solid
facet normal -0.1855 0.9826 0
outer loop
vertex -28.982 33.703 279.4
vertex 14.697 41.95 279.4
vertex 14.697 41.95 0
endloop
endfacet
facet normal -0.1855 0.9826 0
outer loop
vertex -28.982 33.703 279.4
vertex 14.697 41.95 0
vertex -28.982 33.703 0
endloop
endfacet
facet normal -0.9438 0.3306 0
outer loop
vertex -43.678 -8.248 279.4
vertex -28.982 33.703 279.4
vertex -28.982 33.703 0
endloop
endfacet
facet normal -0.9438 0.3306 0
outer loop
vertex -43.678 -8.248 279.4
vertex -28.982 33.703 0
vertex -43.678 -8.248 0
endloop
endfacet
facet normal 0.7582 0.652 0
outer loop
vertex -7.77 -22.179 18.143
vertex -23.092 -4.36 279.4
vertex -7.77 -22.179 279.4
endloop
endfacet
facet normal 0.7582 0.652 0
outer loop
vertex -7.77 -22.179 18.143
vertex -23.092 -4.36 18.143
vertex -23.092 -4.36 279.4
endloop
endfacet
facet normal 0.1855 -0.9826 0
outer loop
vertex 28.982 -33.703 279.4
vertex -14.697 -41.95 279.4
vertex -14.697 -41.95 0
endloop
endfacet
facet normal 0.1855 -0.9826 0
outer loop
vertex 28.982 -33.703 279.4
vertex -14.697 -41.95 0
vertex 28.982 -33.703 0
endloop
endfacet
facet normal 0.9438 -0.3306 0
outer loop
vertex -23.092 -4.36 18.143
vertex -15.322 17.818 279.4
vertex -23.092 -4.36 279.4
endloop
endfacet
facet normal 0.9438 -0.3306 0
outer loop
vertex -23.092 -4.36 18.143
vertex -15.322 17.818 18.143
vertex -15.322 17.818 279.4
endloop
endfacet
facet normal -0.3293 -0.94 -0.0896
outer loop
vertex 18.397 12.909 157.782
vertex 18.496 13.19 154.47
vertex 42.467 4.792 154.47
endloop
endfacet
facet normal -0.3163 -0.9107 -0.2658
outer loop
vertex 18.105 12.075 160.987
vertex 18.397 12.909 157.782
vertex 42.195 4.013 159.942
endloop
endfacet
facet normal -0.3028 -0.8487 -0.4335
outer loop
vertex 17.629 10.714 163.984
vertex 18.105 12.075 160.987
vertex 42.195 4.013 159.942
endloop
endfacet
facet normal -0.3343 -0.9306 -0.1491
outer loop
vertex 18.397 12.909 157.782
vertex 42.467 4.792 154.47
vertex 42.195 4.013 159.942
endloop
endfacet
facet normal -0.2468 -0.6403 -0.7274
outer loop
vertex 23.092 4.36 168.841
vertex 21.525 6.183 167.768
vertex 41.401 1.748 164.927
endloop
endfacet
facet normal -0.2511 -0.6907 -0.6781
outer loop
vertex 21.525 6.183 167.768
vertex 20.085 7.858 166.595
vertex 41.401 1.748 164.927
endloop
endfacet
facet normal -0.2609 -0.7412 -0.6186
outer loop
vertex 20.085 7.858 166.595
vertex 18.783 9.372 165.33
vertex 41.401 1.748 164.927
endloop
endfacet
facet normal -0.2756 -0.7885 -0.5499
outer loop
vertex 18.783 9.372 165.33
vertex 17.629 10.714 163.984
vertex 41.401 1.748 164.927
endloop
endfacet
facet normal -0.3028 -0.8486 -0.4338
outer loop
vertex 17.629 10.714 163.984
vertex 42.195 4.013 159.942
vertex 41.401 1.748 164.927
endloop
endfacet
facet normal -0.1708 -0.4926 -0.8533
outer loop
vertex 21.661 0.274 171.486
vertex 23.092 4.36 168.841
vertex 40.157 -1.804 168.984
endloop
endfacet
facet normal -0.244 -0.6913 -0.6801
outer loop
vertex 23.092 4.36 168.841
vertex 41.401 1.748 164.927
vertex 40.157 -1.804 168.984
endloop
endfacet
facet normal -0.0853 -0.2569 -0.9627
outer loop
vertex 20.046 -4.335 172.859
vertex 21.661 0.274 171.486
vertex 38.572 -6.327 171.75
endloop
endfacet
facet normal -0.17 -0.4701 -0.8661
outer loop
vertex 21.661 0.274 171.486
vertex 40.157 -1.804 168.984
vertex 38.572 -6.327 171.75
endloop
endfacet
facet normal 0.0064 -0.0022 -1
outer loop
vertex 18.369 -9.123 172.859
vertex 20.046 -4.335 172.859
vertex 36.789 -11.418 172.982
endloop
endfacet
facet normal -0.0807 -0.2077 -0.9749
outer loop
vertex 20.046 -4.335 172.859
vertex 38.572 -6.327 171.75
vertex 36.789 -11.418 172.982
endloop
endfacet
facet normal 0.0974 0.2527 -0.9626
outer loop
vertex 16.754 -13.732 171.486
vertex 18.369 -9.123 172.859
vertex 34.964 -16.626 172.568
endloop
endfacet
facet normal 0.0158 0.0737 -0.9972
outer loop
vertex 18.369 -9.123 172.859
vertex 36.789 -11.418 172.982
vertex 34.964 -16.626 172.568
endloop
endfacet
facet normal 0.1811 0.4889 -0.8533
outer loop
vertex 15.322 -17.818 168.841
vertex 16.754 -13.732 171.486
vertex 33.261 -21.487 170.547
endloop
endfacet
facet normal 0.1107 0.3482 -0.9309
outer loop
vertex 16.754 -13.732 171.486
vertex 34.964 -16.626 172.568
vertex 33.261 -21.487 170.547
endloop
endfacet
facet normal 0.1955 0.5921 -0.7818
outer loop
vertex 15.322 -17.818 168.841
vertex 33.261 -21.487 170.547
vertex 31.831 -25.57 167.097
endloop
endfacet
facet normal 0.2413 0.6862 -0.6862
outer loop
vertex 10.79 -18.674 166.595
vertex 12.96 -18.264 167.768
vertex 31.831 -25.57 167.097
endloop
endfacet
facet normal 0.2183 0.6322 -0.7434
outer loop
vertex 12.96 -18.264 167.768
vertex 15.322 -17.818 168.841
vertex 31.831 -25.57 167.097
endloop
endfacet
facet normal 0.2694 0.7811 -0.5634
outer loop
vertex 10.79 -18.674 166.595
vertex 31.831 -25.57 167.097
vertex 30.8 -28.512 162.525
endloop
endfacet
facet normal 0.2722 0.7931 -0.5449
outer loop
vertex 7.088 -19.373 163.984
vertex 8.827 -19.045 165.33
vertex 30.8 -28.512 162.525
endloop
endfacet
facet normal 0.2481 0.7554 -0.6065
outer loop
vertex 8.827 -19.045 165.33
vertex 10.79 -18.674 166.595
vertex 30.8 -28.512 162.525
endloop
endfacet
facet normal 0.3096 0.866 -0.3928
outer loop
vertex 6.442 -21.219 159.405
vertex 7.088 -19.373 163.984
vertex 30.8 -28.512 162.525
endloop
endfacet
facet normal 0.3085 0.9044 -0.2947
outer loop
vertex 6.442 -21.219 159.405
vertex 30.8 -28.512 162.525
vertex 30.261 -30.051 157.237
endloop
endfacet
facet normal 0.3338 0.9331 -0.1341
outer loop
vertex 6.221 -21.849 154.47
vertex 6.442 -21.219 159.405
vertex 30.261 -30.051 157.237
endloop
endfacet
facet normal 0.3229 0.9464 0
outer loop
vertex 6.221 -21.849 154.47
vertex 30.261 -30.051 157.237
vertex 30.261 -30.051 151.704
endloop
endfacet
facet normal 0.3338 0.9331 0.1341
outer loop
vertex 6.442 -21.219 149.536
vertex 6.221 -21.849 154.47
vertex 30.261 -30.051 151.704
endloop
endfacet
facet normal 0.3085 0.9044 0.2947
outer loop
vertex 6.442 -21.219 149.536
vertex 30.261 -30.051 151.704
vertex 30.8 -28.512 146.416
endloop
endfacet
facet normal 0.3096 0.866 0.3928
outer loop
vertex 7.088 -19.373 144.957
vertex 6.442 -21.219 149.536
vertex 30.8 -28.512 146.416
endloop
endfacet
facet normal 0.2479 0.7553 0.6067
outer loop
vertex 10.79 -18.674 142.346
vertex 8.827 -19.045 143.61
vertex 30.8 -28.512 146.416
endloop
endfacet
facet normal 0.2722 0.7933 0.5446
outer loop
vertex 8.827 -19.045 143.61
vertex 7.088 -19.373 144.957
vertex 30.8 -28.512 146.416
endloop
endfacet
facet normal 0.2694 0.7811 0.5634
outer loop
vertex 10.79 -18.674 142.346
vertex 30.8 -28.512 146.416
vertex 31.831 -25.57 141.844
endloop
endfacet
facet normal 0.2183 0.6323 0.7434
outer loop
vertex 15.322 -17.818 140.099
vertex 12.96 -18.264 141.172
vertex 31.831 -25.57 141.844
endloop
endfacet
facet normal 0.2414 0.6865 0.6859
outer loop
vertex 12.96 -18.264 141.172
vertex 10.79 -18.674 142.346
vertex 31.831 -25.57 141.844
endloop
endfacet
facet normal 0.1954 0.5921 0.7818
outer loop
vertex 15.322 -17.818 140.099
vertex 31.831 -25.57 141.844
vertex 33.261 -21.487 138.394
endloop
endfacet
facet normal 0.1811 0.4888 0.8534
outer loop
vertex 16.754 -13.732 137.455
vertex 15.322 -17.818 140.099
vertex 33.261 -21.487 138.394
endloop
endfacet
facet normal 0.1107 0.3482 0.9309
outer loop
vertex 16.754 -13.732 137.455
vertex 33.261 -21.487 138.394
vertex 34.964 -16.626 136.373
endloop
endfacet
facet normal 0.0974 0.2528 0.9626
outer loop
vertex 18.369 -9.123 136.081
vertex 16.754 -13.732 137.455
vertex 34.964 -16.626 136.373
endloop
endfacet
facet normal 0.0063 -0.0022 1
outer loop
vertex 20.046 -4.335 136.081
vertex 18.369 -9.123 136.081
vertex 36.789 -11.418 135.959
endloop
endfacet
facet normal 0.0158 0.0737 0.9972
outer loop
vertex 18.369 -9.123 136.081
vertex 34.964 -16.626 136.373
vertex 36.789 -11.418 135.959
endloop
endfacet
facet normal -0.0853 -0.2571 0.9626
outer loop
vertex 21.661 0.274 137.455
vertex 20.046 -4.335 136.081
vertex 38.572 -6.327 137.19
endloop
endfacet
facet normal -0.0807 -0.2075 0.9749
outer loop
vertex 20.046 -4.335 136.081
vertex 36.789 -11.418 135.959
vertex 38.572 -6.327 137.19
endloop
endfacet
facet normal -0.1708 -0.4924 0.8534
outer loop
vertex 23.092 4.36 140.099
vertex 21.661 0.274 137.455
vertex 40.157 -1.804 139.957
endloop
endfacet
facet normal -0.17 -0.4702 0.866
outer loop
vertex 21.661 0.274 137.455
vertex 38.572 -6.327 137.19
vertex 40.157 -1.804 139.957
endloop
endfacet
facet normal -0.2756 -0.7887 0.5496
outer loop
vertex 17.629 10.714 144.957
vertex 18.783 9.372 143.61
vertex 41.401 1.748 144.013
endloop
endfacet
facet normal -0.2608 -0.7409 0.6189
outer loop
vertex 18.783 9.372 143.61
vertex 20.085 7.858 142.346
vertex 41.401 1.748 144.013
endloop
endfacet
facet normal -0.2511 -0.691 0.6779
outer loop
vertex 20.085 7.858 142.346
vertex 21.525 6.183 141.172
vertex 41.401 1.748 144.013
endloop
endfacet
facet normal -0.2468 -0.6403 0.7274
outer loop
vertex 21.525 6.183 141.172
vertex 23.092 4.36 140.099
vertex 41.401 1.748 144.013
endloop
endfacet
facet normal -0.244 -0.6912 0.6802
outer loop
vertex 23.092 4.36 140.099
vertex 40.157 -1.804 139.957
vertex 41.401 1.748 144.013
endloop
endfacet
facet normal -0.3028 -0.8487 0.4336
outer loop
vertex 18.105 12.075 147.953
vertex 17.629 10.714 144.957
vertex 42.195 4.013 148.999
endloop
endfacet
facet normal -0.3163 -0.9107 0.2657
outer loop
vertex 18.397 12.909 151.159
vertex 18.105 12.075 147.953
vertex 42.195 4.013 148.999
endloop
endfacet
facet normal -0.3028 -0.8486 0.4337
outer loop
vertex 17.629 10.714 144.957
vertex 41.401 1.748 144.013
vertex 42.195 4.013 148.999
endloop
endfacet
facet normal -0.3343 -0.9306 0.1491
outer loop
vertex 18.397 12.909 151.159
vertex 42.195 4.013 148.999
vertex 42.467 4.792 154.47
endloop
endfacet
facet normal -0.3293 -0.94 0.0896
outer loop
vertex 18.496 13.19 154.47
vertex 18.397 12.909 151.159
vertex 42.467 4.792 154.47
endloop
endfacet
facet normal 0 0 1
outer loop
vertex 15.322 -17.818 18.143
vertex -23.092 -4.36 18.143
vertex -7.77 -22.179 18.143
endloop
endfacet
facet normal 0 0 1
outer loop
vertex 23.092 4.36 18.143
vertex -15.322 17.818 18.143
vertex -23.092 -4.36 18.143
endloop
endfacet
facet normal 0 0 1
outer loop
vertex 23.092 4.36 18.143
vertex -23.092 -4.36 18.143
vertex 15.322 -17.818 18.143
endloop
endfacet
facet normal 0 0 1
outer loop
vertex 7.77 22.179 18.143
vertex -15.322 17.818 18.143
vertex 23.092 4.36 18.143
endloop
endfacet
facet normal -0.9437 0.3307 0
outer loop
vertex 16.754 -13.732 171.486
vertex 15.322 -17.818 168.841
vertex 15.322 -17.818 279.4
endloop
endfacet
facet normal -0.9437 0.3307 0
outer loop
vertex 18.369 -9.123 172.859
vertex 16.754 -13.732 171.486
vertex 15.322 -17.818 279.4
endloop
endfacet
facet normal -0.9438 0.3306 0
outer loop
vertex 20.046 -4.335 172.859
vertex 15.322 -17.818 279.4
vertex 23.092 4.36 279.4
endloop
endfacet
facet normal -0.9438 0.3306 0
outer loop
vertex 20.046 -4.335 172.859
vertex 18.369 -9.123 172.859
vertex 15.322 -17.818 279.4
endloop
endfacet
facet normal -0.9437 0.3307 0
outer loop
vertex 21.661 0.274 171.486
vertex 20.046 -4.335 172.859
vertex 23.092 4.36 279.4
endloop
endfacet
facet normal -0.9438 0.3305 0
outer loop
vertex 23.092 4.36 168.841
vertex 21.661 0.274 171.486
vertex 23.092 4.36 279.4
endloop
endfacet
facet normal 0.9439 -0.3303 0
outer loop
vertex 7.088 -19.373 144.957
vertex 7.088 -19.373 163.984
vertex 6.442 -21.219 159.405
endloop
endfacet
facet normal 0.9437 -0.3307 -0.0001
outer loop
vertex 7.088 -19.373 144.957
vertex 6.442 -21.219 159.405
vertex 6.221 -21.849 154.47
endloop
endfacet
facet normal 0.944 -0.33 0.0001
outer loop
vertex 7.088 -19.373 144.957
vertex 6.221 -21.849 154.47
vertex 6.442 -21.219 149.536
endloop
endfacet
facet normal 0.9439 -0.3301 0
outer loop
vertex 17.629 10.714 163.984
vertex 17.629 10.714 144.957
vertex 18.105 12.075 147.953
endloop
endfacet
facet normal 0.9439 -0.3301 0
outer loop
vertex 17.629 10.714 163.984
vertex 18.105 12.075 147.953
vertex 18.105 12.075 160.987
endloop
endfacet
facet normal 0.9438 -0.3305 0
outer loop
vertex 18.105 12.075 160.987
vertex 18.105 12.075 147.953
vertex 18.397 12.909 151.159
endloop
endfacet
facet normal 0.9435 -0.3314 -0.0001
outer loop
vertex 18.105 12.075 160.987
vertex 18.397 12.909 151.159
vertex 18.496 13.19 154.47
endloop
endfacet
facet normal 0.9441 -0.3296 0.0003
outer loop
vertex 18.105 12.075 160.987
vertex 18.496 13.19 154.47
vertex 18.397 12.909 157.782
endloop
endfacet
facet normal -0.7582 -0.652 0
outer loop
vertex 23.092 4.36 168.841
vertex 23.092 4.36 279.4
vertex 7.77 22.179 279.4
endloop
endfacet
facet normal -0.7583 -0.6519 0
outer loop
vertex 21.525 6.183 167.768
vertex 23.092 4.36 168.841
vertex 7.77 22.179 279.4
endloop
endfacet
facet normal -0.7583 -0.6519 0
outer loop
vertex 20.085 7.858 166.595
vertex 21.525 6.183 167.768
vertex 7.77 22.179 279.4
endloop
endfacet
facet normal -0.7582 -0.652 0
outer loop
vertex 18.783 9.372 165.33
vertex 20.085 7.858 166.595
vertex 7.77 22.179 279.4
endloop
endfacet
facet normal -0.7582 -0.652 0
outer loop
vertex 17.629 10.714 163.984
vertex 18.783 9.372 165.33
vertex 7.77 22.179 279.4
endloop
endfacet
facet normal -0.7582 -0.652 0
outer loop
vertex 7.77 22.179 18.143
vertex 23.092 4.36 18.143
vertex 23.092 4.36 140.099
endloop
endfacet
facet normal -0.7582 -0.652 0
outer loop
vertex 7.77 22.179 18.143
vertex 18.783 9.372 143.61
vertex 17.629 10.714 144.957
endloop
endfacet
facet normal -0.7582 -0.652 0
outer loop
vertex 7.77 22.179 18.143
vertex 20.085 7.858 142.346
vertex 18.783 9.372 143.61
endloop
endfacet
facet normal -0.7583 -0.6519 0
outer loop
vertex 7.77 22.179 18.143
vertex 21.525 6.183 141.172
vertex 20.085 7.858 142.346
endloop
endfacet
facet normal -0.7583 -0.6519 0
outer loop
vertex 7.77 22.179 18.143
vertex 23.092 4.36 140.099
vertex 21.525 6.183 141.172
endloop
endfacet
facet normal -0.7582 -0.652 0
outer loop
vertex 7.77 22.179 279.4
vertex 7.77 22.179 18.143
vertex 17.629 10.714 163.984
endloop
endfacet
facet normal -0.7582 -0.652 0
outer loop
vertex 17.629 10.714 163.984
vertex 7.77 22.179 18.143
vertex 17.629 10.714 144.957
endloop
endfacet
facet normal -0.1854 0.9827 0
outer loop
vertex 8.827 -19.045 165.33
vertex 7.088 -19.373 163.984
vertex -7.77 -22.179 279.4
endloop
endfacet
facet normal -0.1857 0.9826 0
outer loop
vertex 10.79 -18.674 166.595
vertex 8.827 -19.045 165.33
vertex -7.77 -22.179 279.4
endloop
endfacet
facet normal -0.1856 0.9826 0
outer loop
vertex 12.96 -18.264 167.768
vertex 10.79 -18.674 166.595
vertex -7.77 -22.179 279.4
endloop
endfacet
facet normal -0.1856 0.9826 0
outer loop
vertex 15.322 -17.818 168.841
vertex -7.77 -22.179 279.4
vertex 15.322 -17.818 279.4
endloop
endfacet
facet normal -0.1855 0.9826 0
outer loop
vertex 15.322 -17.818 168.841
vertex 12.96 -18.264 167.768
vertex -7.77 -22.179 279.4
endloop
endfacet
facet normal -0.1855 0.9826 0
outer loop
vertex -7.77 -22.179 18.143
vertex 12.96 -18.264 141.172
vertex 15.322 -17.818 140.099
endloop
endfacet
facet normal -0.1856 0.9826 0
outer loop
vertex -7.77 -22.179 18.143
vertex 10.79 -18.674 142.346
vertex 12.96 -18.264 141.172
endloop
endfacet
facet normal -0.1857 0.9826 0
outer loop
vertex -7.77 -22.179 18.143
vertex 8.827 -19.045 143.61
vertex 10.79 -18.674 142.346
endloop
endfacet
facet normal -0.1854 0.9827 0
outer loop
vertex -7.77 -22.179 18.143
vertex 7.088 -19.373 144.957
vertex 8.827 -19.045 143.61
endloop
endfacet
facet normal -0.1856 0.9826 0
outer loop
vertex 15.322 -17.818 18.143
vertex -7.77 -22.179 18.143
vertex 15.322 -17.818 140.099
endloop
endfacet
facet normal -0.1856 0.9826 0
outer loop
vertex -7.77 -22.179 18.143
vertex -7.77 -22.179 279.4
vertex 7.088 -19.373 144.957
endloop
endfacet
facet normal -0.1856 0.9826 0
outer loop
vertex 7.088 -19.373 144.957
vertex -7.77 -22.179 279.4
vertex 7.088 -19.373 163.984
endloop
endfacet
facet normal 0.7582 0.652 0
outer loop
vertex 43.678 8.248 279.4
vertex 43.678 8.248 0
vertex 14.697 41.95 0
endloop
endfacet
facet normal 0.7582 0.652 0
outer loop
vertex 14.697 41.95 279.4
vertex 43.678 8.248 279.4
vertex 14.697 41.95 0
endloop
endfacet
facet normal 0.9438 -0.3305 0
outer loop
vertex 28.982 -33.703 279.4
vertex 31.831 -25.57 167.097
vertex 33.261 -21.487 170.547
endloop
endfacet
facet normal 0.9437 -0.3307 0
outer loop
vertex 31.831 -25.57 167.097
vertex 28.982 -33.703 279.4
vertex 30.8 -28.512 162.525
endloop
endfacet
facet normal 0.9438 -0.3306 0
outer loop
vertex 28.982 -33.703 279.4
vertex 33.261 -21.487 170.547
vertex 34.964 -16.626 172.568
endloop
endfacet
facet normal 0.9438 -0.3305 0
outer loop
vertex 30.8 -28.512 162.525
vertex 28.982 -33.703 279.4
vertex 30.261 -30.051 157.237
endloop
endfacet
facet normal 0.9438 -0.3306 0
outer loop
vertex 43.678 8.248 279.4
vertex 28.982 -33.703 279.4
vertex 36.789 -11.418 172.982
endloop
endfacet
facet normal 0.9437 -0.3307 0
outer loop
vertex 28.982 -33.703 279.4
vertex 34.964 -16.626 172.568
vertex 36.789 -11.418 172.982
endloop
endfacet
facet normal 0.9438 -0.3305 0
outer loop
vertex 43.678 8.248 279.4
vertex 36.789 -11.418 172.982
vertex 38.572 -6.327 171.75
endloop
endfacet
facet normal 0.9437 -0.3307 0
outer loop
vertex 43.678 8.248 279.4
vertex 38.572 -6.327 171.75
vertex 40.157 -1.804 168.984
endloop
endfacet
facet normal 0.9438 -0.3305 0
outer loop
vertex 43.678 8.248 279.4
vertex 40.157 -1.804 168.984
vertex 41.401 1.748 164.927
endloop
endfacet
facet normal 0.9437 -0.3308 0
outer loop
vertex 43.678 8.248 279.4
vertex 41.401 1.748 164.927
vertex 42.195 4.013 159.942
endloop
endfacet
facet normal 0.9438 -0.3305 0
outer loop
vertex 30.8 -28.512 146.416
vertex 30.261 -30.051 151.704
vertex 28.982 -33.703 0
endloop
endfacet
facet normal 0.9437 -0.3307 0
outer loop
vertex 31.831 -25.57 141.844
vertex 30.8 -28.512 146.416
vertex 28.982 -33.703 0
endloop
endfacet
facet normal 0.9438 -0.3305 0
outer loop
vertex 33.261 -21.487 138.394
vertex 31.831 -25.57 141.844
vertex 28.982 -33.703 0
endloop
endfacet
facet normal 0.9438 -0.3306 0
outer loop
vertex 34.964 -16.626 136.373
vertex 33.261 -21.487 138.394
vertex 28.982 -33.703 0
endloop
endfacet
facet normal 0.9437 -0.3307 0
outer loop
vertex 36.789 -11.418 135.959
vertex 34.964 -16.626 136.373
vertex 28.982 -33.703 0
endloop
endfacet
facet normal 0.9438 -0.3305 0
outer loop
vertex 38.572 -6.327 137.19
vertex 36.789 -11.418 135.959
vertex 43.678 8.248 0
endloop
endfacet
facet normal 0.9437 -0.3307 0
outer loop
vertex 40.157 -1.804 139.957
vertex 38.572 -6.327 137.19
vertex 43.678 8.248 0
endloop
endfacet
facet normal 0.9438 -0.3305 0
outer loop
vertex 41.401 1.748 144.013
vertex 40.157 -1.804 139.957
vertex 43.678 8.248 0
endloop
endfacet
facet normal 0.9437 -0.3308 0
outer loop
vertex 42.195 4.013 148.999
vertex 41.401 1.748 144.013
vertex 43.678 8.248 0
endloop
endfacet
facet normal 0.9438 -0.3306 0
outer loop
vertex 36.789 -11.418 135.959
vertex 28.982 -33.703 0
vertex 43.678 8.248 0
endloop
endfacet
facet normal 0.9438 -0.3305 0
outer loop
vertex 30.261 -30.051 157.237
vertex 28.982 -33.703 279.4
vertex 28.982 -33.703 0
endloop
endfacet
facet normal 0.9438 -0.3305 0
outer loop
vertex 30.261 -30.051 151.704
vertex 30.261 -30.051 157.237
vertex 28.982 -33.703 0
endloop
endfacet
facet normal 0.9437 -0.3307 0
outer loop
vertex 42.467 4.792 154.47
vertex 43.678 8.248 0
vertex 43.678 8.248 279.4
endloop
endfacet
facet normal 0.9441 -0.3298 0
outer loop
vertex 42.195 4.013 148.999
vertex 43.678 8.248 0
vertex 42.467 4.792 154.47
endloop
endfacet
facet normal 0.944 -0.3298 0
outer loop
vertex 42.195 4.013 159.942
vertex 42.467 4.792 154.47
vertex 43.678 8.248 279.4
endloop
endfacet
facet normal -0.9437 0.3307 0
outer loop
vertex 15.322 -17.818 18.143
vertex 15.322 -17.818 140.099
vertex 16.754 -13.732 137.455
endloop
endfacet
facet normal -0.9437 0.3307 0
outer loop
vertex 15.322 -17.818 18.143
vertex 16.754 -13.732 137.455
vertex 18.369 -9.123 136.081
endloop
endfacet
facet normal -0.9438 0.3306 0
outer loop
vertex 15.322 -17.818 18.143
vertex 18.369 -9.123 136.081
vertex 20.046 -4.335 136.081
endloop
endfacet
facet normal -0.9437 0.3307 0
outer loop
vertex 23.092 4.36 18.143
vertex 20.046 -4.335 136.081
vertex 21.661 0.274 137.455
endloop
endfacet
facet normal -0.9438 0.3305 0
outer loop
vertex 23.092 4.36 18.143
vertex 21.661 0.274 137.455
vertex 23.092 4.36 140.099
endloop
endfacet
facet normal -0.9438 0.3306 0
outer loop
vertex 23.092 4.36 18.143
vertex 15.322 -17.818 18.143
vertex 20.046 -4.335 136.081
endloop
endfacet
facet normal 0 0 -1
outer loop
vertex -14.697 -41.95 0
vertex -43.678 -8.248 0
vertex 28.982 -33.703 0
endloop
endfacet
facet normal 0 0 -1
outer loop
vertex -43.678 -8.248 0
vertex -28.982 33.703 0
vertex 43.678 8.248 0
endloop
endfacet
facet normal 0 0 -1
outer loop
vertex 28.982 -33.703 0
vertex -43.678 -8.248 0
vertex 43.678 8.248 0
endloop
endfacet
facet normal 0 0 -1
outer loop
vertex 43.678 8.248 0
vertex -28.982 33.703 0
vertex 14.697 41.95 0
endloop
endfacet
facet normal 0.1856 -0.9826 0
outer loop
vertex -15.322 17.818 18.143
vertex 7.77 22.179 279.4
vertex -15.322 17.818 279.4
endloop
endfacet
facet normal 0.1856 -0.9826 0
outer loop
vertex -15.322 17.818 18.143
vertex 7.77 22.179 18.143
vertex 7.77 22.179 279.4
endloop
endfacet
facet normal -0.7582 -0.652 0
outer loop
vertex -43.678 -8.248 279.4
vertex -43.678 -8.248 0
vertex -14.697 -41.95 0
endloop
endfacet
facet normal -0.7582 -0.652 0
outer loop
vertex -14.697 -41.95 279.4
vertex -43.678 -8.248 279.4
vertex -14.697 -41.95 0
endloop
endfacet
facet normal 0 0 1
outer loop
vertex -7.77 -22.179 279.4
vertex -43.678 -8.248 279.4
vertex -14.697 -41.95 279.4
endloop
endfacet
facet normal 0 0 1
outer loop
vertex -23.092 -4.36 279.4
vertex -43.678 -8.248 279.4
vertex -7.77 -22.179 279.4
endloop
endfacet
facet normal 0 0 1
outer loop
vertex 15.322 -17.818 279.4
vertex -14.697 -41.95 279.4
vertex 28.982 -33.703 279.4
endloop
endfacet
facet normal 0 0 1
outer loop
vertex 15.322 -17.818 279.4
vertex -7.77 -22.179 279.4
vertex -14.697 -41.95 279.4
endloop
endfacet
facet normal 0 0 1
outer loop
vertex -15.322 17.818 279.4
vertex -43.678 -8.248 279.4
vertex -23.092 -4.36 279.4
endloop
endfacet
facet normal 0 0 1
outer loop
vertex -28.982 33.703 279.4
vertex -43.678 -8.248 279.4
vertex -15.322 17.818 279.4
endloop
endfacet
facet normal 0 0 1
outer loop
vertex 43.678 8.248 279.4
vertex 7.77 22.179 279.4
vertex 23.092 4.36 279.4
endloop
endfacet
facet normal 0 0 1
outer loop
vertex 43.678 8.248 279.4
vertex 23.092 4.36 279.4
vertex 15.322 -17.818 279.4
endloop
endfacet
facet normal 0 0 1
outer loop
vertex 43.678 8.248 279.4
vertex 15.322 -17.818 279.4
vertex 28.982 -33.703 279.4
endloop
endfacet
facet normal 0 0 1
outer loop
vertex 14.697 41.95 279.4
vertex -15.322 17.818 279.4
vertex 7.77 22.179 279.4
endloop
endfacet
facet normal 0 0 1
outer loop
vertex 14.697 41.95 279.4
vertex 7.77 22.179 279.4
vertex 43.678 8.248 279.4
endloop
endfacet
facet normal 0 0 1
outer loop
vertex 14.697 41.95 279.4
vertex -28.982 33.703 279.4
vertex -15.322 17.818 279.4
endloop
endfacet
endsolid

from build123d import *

# Parameters (mm, degrees)
F1_DEPTH = 279.4
F2_T     = -18.1428571429
F3_R     = 18.5632222349
F4_DEPTH = 25.4


with BuildPart() as f1:
    # F0 (on Top) → F1 (new body)
    with BuildSketch(Plane.XY):
        Polygon((43.678151575, 8.2475193234), (14.6965145353, 41.950148516), (-28.9816370398, 33.7026291926), (-43.678151575, -8.2475193234), (-14.6965145353, -41.950148516), (28.9816370398, -33.7026291926), align=None)
    extrude(amount=F1_DEPTH)

    # F2
    f2_openings = [f1.faces().sort_by_distance(p)[0] for p in [
        (0, 0, 279.4),
    ]]
    offset(amount=F2_T, openings=f2_openings)

    # F3 (on face) → F4 (cut)
    with BuildSketch(Plane(origin=(36.3298943074, -12.7275549346, 0), x_dir=(0.3306302483, 0.9437603716, 0), z_dir=(0.9437603716, -0.3306302483, 0))):
        with Locations((0, 154.4703543186)):
            Circle(F3_R)
    extrude(amount=-F4_DEPTH, mode=Mode.SUBTRACT)


solid = f1.part
